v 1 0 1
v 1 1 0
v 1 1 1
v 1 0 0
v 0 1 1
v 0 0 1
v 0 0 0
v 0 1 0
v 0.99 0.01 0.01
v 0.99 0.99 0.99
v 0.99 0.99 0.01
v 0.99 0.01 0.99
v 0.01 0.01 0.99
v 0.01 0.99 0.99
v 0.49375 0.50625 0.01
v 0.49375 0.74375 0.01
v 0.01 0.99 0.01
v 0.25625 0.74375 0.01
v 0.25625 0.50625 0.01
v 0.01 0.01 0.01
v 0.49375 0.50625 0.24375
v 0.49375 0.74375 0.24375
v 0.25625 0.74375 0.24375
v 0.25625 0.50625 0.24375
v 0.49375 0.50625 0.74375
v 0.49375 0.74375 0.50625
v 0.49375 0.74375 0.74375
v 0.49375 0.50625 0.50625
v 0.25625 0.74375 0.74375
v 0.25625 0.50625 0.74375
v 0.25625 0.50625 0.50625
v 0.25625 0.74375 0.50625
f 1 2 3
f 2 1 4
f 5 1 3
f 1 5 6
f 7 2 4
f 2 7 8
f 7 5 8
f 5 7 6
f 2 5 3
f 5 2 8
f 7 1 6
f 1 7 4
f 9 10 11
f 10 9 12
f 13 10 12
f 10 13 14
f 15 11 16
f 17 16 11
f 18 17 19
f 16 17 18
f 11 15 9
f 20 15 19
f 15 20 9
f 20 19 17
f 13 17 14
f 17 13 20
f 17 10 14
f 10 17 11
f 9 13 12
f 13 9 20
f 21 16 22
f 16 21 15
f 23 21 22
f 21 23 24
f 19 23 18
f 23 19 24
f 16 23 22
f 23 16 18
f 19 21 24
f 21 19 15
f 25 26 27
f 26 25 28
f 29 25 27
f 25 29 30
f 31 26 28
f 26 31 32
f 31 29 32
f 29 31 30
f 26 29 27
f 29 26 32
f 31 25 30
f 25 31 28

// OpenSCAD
translate([0.375, 0.625, 0.125]) color([0.009493333642860646, 0.6777596548095404, 0.2843312615387745]) cube([0.2375, 0.2375, 0.2375], center=true);
translate([0.375, 0.625, 0.625]) color([0.8774095802560502, 0.8862731454520989, 0.40856169649548846]) cube([0.2375, 0.2375, 0.2375], center=true);
color([0.3,0.3,0.3,0.3]) difference() { cube([1,1,1]); translate([0.01,0.01,0.01]) cube([0.98,0.98,0.98]); }
